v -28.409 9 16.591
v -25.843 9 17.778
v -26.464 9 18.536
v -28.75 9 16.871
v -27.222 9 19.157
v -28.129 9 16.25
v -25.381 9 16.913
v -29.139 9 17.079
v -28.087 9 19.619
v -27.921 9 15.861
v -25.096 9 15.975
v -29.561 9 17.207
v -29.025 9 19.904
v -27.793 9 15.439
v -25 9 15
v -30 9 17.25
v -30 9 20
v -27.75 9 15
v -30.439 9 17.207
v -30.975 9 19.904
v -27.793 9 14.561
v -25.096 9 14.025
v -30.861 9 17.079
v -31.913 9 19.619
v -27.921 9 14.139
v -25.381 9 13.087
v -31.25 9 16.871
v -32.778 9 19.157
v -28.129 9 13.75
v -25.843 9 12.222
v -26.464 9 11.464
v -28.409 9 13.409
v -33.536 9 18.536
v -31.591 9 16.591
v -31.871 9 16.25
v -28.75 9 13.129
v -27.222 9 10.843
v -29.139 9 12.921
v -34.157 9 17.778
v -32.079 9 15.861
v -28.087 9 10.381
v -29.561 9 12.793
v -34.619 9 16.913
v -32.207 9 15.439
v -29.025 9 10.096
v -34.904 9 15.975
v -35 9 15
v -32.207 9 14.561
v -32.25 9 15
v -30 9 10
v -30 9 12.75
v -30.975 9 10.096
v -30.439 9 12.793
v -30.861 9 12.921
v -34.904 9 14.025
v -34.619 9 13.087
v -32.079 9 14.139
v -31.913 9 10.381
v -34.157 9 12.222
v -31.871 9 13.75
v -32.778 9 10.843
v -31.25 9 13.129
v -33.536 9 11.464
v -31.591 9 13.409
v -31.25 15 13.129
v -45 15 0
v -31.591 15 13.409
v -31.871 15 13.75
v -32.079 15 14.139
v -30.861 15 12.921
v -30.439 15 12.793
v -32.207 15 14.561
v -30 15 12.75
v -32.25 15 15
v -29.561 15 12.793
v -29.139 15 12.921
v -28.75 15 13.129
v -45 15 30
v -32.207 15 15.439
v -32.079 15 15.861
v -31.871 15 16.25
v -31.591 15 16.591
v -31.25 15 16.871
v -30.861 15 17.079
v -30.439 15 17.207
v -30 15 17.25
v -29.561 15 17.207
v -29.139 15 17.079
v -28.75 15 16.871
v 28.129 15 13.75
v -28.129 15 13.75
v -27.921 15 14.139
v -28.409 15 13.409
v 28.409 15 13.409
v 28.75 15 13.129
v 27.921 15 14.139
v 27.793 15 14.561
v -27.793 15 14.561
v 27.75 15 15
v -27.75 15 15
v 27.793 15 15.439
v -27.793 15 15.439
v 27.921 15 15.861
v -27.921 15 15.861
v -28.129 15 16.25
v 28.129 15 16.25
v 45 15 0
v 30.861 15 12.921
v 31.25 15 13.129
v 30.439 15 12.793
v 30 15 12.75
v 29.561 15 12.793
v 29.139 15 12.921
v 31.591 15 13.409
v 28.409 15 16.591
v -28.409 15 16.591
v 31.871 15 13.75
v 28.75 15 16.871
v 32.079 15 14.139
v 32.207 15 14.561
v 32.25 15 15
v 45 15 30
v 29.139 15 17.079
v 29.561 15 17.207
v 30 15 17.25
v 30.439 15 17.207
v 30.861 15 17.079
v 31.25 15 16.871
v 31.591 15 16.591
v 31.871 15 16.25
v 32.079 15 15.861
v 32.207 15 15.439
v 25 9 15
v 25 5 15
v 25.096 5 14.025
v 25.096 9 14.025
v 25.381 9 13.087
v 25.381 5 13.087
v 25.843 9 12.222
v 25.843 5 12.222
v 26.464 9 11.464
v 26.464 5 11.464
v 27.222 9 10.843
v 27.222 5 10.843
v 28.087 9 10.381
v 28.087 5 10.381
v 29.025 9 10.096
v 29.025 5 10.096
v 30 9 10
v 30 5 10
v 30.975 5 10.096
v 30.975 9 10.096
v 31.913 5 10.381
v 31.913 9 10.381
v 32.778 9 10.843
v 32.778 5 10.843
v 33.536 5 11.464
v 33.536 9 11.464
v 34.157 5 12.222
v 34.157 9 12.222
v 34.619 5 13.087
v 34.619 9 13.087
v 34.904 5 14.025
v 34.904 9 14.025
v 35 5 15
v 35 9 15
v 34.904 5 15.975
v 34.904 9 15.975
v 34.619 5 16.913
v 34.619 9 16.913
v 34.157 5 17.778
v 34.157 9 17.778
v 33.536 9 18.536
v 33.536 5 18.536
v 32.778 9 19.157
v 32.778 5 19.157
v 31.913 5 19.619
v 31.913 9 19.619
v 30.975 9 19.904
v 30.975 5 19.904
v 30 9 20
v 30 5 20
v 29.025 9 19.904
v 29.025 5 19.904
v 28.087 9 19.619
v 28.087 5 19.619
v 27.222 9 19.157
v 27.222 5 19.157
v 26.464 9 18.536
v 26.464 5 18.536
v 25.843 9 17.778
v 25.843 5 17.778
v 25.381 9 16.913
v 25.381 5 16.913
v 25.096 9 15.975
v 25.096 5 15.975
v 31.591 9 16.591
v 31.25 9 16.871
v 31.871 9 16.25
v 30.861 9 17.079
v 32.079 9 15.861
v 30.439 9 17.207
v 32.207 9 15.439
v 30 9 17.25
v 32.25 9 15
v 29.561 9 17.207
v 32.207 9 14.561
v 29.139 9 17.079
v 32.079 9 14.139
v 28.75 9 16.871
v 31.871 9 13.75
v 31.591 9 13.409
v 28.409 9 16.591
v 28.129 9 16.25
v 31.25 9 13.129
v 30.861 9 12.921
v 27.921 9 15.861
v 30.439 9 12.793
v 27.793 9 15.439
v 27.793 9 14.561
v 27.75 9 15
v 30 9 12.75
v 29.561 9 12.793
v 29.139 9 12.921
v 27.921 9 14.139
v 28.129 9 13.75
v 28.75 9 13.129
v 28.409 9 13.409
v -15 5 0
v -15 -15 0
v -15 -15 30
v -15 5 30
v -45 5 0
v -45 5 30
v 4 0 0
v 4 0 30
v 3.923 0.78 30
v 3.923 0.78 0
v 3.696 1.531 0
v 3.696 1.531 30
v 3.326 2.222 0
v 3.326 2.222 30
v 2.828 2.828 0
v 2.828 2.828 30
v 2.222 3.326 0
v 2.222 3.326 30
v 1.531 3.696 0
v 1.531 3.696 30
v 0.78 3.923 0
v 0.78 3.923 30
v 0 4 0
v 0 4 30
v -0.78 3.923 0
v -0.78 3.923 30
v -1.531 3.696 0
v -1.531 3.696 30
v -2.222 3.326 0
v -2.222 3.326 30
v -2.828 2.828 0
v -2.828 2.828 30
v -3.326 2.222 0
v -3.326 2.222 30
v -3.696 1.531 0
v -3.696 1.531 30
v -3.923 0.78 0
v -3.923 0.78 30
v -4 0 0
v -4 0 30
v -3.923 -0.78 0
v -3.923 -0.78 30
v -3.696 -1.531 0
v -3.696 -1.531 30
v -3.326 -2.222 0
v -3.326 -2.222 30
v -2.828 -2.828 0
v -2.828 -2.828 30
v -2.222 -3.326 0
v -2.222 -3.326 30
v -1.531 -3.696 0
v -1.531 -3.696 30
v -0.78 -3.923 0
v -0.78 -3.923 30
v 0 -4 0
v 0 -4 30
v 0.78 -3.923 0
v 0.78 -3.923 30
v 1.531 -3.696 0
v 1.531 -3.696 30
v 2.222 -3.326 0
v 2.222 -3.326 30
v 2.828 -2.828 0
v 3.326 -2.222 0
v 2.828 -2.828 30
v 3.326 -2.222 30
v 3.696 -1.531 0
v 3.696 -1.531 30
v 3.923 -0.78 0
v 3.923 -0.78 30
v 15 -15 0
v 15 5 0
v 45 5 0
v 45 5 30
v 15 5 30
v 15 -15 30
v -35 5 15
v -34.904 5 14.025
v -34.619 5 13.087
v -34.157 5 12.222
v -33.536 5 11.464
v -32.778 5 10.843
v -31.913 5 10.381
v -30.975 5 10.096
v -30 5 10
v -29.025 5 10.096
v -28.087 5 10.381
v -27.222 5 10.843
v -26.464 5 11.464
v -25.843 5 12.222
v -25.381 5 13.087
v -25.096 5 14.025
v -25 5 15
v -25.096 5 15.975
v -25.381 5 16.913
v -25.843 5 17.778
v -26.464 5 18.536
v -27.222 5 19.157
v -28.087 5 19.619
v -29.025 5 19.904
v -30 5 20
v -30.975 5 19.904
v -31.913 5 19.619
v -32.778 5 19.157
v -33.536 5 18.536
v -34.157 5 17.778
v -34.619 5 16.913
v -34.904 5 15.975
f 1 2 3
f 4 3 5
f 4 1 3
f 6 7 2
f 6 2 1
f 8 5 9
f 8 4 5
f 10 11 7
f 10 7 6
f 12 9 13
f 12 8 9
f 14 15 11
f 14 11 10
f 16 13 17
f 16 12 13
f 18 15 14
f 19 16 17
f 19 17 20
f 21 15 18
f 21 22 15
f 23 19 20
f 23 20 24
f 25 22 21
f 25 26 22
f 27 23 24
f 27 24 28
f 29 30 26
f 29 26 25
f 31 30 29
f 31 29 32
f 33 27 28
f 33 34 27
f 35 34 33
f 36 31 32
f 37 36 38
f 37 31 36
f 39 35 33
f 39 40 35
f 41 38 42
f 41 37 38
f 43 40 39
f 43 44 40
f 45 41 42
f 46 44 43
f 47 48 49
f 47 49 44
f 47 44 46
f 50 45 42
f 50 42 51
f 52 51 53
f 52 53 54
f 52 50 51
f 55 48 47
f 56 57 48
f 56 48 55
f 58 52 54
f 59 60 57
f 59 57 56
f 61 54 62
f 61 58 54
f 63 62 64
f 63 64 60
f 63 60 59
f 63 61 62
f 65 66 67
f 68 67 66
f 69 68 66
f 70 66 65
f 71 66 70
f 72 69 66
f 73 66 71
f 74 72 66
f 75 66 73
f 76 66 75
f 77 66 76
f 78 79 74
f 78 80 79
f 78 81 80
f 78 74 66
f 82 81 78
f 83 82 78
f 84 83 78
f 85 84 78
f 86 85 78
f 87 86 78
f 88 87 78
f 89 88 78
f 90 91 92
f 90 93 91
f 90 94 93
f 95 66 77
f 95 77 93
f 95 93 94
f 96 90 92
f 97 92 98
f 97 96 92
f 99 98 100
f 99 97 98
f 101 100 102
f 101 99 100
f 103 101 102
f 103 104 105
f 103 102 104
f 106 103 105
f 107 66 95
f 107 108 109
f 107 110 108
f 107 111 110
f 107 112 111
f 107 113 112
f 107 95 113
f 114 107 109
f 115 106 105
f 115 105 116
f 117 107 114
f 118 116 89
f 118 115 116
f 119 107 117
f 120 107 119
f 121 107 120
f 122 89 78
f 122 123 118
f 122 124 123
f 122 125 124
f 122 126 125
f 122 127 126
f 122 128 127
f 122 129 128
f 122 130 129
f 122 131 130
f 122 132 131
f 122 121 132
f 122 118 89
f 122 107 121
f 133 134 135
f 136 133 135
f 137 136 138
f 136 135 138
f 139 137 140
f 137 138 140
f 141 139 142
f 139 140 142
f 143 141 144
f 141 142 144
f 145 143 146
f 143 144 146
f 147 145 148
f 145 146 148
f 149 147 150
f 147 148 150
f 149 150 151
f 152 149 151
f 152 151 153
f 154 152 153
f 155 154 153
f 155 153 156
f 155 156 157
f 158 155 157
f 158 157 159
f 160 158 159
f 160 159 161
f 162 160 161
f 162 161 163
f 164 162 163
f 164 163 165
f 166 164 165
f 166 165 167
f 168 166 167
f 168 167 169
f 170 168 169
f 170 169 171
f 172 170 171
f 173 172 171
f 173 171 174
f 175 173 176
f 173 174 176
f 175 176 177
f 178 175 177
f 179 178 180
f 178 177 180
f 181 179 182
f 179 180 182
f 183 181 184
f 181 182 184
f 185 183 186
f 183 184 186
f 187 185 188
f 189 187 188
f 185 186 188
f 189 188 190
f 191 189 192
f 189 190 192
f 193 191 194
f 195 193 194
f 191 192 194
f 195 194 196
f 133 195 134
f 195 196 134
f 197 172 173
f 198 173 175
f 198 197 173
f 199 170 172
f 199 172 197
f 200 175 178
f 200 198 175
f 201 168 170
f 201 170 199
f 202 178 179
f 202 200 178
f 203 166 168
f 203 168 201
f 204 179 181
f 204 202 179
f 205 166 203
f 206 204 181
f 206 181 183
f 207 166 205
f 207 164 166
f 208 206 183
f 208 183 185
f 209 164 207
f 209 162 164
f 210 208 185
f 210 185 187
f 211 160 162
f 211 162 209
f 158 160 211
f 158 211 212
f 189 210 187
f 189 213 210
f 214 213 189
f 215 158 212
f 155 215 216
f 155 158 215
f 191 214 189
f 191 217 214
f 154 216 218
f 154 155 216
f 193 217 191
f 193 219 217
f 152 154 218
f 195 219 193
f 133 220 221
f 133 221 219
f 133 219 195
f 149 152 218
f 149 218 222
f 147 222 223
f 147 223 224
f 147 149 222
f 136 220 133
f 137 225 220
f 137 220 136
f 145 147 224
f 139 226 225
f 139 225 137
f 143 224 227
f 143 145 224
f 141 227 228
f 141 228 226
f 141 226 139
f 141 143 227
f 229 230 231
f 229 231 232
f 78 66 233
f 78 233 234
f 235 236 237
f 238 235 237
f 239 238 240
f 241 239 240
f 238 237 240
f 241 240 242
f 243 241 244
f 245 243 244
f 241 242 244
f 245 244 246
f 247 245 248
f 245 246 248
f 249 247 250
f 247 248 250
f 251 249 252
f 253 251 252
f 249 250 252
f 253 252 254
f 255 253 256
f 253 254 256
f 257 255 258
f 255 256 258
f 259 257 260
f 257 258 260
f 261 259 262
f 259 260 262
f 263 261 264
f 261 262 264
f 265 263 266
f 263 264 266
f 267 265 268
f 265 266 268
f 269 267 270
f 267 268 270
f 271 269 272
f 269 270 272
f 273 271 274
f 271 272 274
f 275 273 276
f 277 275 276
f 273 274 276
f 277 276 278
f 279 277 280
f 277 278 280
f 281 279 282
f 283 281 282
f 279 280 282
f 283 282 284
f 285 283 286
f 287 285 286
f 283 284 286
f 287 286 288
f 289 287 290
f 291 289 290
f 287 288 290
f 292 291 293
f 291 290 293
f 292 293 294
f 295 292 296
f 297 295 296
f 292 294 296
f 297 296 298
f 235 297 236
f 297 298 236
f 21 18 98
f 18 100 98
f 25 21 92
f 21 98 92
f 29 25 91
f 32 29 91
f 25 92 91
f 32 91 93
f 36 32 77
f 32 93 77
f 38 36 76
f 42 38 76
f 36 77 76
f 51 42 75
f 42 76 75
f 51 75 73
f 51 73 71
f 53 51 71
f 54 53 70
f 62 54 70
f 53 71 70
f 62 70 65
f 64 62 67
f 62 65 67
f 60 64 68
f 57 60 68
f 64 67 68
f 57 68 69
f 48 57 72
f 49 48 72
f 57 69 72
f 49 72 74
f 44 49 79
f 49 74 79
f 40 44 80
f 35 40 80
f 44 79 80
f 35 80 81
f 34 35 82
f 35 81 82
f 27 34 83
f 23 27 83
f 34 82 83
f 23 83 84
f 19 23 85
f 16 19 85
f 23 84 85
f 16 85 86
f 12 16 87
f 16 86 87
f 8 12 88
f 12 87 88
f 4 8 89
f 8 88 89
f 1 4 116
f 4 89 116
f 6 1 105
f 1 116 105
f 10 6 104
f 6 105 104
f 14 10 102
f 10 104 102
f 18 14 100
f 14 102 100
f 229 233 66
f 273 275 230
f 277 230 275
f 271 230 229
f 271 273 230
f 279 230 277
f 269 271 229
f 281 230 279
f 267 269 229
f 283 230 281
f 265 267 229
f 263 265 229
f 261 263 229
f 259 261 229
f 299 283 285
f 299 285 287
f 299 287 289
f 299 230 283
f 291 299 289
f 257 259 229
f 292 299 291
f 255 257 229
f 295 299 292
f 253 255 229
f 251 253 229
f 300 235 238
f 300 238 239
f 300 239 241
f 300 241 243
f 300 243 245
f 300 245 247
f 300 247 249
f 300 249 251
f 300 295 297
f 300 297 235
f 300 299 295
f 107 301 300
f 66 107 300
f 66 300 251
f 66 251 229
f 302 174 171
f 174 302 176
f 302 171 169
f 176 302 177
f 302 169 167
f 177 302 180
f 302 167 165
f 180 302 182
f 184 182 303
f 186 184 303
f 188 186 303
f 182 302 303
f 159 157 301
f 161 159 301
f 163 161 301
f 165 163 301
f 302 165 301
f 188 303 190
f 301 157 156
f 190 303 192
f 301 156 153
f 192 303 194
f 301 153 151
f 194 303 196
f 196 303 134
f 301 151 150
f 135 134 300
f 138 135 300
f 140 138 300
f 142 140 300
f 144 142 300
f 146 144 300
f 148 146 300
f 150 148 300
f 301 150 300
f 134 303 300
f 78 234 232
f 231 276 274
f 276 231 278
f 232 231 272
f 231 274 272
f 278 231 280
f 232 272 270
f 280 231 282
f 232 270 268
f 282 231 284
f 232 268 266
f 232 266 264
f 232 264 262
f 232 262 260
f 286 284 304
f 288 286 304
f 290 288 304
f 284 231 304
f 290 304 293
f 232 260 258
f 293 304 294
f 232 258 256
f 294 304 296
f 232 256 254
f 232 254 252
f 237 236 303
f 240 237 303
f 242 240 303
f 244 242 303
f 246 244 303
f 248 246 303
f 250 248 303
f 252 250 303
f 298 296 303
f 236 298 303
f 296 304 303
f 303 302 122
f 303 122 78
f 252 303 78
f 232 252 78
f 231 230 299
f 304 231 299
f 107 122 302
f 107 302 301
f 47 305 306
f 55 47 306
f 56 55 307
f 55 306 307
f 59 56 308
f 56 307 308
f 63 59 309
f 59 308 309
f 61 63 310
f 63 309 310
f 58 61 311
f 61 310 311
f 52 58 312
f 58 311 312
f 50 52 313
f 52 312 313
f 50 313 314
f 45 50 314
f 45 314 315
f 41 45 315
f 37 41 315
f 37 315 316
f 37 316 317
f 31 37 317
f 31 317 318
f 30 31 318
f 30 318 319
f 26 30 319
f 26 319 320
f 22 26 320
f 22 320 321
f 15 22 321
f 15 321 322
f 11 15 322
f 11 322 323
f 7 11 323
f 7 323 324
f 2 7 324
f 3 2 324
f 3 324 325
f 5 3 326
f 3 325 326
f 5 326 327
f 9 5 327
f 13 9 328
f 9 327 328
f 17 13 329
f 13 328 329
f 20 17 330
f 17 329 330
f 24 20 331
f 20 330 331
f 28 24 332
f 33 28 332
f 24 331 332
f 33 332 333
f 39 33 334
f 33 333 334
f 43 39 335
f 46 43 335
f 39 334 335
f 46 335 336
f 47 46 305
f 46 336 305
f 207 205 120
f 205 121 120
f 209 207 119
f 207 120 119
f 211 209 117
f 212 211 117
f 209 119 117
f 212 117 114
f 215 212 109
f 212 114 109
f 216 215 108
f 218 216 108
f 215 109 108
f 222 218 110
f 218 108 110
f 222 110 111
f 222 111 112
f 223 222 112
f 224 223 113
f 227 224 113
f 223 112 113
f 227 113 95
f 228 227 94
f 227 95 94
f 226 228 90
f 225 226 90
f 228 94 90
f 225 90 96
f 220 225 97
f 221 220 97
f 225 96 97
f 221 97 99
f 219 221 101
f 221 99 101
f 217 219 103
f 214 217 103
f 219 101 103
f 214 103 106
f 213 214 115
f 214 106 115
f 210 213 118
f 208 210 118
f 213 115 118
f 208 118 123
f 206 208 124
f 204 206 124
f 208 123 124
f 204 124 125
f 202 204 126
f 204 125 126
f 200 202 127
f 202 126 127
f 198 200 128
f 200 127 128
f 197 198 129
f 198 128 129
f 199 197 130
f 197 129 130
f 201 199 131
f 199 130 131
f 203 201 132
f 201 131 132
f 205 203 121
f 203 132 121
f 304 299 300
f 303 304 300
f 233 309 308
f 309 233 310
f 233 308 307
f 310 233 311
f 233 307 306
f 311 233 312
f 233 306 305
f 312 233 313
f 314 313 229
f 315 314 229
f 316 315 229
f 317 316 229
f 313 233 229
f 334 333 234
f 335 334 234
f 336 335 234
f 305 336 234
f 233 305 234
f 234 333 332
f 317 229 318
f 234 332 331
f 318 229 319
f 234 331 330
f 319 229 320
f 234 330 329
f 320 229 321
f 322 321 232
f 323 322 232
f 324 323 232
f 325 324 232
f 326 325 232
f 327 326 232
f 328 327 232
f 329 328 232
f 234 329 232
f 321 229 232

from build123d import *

# Parameters (mm, degrees)
SKETCH_1_W                   = 30
SKETCH_1_H                   = 30
EXTRUDE_1_DEPTH              = 30
SKETCH_2_R                   = 4
CUT_EXTRUDE_1_DEPTH          = 30
SKETCH_3_W                   = 30
SKETCH_3_H                   = 10
EXTRUDE_2_DEPTH              = 30
SKETCH_4_W                   = 30
SKETCH_4_H                   = 10
EXTRUDE_3_DEPTH              = 30
HOLE_WIZARD_M4_1_D           = 4.5
HOLE_WIZARD_M4_1_CBORE_D     = 10
HOLE_WIZARD_M4_1_CBORE_DEPTH = 4


with BuildPart() as part:
    # 스케치1 → 보스-돌출1 (new body)
    with BuildSketch(Plane.XY):
        Rectangle(SKETCH_1_W, SKETCH_1_H)
    extrude(amount=EXTRUDE_1_DEPTH)

    # 스케치2 → 컷-돌출1 (cut)
    with BuildSketch(Plane.XY.offset(30)):
        Circle(SKETCH_2_R)
    extrude(amount=-CUT_EXTRUDE_1_DEPTH, mode=Mode.SUBTRACT)

    # 스케치3 → 보스-돌출2 (add)
    with BuildSketch(Plane(origin=(15, 0, 0), x_dir=(0, 0, -1), z_dir=(1, 0, 0))):
        with Locations((-15, 10)):
            Rectangle(SKETCH_3_W, SKETCH_3_H)
    extrude(amount=EXTRUDE_2_DEPTH)

    # 스케치4 → 보스-돌출3 (add)
    with BuildSketch(Plane.ZY.offset(15)):
        with Locations((15, 10)):
            Rectangle(SKETCH_4_W, SKETCH_4_H)
    extrude(amount=EXTRUDE_3_DEPTH)

    # M4 소켓 머리 캡 나사용 카운터보어1 (through all)
    with Locations(Plane(origin=(0, 5, 0), x_dir=(-1, 0, 0), z_dir=(0, -1, 0))):
        with Locations((-30, -15), (30, -15)):
            CounterBoreHole(HOLE_WIZARD_M4_1_D / 2, HOLE_WIZARD_M4_1_CBORE_D / 2, HOLE_WIZARD_M4_1_CBORE_DEPTH)


solid = part.part
